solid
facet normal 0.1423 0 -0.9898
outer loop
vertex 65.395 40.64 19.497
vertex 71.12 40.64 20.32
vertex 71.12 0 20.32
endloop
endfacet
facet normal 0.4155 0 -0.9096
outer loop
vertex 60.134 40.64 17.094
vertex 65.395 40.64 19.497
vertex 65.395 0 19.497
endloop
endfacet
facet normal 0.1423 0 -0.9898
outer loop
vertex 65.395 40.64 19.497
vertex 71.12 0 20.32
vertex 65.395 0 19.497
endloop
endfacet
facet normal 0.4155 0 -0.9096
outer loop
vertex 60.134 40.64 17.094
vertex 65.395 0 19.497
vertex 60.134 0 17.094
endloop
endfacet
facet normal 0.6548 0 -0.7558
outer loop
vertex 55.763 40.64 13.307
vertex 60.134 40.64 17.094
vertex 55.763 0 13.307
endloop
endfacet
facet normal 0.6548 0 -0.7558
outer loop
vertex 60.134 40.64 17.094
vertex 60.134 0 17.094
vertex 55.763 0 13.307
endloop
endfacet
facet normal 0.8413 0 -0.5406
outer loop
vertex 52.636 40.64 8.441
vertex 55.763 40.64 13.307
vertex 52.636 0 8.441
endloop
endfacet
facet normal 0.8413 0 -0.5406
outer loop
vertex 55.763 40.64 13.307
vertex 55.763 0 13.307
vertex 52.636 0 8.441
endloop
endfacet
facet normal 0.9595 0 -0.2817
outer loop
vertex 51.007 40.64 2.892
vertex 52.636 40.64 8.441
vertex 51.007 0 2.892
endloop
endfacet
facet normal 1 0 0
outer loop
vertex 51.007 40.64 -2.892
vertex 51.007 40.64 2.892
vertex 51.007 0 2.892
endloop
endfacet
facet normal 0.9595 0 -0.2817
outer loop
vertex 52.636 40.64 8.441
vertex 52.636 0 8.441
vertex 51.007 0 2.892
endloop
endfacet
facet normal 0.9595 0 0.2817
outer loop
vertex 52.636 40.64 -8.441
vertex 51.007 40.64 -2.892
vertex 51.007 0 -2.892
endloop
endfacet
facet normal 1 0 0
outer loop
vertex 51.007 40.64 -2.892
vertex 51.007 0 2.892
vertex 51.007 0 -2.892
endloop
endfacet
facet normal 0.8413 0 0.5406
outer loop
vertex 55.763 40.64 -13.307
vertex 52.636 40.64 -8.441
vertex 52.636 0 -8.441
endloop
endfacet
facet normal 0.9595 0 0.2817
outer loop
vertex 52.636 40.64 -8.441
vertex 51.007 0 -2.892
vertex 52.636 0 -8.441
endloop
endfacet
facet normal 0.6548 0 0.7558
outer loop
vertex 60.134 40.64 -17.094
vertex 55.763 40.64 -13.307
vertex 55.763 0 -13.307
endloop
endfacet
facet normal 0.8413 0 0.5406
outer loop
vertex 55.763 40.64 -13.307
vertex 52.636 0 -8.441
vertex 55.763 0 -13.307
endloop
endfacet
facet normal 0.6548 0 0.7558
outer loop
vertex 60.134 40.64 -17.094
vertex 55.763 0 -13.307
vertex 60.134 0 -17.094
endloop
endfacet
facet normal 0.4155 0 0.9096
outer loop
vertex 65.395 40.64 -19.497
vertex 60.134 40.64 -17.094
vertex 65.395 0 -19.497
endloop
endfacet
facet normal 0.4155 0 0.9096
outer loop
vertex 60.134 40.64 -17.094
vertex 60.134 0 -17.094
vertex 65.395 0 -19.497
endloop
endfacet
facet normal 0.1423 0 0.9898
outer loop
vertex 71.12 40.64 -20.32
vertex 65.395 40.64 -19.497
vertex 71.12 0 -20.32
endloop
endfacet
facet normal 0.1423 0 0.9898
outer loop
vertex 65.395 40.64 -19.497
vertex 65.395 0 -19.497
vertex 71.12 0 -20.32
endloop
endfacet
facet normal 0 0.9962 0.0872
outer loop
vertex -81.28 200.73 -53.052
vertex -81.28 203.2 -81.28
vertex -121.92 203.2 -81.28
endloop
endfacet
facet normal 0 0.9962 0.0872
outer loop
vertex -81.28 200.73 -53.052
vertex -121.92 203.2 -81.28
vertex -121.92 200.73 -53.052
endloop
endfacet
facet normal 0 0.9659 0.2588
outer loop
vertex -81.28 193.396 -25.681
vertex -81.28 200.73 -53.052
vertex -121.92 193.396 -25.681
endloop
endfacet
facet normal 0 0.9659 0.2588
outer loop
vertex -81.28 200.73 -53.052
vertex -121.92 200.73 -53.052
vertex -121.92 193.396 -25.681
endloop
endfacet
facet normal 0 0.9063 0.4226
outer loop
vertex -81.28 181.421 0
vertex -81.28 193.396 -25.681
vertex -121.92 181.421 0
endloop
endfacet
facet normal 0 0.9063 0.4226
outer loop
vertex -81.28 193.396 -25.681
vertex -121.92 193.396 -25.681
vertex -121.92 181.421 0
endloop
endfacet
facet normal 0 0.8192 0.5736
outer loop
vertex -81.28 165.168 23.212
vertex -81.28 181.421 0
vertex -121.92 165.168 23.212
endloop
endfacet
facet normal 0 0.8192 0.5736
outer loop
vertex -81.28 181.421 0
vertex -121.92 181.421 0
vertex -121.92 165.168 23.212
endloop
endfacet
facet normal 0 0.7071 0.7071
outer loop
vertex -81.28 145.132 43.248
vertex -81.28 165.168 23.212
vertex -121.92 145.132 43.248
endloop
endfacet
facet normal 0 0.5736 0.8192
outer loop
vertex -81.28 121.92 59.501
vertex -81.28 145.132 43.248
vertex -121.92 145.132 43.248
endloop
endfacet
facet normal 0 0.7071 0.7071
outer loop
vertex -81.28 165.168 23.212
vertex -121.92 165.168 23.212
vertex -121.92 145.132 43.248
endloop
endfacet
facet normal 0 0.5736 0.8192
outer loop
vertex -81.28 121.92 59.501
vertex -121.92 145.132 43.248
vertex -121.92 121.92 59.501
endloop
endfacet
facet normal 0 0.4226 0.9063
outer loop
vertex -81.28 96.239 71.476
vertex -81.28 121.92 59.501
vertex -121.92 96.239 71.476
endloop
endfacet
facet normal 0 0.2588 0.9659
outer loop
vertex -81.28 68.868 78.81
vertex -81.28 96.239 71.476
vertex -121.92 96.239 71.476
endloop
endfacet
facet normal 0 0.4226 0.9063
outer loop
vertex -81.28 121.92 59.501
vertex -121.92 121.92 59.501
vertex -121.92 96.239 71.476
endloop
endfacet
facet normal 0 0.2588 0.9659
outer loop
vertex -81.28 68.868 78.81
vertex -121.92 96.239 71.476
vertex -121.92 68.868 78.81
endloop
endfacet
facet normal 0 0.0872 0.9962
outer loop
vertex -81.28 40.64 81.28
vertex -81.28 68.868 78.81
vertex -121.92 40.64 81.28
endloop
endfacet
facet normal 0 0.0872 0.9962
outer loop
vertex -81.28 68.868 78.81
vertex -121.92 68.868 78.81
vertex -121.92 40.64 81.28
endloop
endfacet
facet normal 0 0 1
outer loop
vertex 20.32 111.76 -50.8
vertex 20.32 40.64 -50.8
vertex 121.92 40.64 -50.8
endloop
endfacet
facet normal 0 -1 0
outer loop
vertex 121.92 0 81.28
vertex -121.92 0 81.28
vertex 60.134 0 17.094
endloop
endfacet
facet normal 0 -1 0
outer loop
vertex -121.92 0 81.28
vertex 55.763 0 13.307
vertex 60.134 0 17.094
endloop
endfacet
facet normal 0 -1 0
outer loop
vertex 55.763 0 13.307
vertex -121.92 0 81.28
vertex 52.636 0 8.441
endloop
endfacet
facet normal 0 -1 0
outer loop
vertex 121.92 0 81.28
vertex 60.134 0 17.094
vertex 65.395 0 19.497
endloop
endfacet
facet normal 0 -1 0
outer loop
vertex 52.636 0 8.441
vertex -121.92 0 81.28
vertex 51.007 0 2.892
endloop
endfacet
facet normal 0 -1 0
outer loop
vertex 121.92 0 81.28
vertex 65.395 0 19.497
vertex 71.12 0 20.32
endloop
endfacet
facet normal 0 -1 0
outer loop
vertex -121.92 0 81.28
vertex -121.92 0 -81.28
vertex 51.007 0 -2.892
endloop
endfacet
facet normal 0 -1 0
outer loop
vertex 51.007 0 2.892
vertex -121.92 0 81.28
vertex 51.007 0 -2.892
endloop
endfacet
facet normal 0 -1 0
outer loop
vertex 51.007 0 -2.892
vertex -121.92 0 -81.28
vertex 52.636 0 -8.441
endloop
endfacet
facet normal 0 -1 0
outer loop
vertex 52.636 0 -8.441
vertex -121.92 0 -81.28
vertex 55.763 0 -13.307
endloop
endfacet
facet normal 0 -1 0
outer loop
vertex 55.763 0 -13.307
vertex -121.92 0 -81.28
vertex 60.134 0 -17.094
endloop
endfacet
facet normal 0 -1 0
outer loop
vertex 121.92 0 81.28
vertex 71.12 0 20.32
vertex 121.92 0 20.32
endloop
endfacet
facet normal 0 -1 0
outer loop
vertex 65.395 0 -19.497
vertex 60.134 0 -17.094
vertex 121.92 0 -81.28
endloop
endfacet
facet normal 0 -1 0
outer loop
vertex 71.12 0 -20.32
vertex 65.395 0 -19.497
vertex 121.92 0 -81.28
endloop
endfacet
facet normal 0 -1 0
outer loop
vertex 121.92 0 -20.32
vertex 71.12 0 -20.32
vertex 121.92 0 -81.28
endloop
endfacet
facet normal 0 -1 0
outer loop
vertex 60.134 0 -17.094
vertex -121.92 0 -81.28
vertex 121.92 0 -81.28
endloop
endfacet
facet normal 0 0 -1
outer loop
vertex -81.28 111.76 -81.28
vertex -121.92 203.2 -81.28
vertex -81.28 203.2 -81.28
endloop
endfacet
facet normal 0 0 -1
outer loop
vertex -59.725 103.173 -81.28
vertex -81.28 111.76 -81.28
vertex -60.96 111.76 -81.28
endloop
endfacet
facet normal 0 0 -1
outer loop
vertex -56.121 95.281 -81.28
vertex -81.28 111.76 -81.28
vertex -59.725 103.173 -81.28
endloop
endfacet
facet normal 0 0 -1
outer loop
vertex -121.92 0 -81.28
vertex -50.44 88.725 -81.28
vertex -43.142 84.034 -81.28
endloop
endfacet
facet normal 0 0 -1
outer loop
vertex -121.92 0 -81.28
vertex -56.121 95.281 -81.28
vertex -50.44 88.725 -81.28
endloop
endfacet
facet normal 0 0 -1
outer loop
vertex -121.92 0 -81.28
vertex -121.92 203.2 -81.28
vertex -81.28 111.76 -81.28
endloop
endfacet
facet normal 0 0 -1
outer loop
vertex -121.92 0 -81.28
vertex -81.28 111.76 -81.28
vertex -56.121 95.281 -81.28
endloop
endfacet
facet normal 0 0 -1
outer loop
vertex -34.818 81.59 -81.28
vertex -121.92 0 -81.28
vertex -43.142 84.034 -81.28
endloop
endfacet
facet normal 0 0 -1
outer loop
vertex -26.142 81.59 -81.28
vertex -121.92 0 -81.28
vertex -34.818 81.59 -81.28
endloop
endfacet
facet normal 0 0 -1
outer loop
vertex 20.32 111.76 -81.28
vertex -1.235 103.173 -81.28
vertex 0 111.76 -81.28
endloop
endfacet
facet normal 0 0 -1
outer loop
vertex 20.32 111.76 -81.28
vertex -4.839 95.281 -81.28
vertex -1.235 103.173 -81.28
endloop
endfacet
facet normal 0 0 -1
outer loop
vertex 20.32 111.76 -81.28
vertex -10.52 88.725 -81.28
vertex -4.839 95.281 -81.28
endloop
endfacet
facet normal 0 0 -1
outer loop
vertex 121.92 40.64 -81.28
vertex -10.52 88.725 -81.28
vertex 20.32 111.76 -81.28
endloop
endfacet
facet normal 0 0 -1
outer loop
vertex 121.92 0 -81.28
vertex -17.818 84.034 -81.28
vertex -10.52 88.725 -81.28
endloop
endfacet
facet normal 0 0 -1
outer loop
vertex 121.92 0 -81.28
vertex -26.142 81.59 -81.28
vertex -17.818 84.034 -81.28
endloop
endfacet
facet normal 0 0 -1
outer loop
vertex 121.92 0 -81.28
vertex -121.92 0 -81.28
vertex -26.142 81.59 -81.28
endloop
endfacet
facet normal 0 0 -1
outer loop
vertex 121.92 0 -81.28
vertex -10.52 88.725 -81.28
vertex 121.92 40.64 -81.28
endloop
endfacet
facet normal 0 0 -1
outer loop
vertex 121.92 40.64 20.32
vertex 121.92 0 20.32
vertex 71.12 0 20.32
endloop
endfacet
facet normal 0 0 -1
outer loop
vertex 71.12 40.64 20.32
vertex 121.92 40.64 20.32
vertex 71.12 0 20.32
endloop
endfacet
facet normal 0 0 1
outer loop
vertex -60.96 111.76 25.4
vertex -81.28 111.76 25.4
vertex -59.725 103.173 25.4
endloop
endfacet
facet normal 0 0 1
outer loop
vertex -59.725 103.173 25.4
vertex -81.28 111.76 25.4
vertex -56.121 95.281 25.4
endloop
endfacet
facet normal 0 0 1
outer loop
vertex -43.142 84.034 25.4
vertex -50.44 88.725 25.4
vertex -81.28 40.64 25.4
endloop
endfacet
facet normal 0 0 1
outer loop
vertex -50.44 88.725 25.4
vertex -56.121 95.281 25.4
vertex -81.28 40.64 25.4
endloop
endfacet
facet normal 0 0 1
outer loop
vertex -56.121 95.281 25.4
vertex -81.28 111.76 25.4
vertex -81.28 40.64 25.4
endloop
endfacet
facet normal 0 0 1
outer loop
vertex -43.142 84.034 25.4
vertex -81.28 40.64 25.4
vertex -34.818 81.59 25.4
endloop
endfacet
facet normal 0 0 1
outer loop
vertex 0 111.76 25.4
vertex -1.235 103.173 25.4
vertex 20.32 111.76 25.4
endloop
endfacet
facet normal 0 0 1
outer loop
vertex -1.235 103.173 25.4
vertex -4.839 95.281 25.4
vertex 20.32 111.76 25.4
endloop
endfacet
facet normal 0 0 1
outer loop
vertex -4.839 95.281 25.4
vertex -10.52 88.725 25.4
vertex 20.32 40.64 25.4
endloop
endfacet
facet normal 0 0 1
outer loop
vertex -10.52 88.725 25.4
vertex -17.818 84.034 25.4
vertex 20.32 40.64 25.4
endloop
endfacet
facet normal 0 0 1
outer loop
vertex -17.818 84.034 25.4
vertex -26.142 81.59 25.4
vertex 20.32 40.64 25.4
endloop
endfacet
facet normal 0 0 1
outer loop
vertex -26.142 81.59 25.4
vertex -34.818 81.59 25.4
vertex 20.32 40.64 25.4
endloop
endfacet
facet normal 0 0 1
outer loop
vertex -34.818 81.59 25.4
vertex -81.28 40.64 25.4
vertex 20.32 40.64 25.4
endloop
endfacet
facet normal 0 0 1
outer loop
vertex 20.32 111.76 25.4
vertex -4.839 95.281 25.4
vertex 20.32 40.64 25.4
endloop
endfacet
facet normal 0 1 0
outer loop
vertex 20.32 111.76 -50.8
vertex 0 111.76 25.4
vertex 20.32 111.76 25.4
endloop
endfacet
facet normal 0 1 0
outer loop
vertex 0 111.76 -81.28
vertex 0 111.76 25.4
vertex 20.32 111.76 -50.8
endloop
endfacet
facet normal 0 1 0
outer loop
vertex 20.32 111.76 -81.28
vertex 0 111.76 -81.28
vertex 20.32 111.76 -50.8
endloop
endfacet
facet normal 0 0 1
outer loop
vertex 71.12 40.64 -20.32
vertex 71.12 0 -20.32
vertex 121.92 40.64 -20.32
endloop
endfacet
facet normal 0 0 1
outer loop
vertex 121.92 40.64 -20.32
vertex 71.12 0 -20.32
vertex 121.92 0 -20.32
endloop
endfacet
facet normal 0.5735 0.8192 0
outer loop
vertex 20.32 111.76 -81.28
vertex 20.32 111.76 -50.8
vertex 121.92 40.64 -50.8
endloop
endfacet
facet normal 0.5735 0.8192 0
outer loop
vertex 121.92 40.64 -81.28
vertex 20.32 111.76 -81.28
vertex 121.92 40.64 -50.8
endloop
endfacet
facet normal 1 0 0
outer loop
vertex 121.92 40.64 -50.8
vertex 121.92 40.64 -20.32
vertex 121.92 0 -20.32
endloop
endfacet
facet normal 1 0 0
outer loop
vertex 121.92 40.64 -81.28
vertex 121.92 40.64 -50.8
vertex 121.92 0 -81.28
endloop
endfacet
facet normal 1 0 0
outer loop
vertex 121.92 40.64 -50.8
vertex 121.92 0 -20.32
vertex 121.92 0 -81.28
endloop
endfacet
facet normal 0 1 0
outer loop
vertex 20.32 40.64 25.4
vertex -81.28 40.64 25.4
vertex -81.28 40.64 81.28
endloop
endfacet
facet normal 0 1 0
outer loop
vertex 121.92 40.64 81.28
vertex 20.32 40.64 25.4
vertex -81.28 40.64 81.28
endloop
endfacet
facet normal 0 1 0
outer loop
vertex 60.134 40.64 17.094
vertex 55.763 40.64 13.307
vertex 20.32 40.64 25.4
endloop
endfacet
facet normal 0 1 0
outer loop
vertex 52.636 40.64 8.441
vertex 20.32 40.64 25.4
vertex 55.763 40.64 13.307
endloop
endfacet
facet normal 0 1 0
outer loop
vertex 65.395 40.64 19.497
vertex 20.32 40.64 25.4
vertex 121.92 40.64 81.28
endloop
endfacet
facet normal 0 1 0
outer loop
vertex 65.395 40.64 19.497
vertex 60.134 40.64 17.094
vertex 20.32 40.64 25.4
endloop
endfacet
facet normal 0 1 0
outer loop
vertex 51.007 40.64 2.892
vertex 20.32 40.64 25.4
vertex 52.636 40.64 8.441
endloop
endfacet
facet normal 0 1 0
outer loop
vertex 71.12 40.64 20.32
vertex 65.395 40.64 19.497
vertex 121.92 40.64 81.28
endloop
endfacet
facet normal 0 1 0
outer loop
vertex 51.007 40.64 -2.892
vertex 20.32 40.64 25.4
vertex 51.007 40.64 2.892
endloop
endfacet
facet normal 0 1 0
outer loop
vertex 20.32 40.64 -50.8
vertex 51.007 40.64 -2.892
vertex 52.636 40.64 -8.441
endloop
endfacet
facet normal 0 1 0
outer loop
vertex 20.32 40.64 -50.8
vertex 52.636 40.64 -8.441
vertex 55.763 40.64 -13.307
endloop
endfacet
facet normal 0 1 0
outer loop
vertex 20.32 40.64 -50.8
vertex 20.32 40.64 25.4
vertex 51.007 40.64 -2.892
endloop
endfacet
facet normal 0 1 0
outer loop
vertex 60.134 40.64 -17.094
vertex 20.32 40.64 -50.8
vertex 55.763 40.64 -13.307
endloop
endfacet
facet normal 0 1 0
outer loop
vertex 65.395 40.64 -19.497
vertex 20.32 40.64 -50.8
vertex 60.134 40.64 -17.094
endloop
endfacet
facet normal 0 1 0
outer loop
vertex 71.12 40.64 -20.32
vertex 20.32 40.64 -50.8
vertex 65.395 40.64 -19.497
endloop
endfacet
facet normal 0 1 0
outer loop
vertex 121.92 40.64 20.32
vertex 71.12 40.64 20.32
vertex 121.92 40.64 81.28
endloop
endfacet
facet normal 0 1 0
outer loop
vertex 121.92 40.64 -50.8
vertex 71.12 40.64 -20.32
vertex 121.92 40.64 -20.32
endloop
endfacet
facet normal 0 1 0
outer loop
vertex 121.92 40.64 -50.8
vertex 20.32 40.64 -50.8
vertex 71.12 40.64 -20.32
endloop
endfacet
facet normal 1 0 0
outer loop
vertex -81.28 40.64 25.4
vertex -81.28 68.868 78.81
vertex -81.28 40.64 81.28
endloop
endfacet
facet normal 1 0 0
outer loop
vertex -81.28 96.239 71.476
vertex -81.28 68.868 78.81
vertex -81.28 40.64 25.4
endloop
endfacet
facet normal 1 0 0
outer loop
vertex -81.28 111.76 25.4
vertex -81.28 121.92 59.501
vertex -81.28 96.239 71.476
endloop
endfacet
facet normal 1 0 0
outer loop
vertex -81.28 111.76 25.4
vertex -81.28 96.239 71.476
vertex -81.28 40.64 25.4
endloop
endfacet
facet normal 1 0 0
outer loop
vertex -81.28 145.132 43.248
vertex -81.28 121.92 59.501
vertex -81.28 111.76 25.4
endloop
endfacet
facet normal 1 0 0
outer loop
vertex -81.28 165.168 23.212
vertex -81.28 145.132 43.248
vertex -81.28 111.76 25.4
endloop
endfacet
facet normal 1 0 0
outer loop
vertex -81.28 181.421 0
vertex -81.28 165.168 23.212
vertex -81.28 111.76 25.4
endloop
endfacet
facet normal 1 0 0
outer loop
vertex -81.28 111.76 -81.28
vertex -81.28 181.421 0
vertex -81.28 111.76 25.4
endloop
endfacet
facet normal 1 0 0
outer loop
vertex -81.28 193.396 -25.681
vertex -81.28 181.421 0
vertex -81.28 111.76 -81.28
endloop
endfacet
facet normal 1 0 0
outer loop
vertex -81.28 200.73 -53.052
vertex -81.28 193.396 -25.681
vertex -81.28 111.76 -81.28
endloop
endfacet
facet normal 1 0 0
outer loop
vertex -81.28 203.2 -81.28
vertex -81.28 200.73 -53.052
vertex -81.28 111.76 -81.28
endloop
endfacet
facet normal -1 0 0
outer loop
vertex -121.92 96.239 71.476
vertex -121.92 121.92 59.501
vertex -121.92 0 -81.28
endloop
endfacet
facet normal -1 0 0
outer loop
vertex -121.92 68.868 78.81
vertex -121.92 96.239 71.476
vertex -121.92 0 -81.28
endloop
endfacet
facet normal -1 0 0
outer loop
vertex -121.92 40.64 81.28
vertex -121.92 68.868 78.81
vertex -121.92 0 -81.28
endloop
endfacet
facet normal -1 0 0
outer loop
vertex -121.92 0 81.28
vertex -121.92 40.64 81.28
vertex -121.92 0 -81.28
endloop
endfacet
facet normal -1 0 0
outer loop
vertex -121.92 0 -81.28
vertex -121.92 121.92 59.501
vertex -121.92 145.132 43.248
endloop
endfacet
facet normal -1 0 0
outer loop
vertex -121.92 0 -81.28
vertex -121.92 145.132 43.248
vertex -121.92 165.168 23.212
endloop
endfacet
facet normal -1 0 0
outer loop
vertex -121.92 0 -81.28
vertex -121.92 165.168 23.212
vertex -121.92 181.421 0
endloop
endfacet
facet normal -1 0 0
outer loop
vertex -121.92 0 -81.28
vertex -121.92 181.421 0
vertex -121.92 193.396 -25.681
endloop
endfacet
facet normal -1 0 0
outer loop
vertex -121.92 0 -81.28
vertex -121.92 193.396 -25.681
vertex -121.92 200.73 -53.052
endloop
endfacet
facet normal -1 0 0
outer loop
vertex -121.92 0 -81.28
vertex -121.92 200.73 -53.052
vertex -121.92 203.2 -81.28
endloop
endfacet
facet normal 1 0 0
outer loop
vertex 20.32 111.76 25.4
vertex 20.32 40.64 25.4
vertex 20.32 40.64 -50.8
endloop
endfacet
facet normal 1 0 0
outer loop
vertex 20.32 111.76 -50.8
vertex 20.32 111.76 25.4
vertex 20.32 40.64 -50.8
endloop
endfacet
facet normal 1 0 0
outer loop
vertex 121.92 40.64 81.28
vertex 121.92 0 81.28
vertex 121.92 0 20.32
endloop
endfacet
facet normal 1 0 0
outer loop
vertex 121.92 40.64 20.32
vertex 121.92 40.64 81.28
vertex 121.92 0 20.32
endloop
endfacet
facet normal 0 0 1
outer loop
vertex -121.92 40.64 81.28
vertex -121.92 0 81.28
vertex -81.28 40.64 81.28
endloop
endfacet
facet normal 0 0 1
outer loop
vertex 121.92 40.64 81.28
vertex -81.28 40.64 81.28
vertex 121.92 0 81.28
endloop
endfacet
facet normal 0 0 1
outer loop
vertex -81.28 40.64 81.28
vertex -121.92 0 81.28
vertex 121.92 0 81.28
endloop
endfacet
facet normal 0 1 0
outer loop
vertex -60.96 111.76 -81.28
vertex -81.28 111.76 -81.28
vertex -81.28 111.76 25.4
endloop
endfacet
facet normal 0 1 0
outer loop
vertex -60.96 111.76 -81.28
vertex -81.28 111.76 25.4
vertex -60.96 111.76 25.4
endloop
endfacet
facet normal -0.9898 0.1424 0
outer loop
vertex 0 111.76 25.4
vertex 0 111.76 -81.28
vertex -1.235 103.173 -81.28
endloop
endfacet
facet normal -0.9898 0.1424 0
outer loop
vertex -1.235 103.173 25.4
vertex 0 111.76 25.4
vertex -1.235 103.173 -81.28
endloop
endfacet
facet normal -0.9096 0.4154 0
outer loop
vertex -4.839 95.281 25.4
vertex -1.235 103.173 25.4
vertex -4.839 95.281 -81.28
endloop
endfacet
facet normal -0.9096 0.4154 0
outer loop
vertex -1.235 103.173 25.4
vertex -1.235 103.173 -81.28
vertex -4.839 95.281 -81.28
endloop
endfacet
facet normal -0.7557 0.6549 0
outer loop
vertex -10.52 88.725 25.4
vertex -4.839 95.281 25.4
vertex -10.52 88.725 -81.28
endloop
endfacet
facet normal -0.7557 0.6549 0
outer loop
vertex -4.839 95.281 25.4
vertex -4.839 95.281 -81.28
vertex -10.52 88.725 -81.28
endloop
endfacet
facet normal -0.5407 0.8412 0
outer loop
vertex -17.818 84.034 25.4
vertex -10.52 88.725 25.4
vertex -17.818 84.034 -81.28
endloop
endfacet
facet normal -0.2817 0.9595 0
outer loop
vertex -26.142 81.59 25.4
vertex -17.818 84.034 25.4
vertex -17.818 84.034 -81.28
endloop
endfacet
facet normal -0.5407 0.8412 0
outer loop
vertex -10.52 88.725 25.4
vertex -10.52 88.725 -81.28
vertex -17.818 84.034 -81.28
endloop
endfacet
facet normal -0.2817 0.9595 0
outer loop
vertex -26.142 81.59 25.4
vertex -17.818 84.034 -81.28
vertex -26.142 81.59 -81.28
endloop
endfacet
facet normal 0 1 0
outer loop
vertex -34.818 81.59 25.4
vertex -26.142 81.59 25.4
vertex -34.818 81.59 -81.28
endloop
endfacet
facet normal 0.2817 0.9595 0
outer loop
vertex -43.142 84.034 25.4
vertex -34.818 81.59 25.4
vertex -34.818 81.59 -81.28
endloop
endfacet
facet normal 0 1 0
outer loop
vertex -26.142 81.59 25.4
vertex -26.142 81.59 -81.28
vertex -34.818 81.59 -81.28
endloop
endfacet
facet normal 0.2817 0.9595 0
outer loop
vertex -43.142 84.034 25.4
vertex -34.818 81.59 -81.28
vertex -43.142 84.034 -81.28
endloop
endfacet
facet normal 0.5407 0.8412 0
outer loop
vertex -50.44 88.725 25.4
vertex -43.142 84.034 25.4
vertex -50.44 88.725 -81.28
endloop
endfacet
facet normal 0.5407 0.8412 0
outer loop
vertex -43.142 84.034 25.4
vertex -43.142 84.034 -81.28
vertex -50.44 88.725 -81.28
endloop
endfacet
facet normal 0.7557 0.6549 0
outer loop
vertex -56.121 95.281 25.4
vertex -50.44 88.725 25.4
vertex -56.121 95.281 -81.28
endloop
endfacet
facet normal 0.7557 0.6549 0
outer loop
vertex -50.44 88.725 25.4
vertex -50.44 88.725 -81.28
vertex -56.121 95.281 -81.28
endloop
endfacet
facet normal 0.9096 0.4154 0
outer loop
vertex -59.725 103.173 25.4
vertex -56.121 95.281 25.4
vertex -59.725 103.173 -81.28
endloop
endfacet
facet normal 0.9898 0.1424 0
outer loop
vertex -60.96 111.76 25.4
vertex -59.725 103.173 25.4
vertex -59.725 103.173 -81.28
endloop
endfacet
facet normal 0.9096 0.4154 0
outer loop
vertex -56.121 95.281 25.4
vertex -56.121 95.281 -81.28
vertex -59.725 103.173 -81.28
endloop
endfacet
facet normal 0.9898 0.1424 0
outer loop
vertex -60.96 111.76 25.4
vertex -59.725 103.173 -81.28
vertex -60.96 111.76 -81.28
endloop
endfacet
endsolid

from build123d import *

# Parameters (mm, degrees)
BOSS_EXTRUDE1_DEPTH     = 40.64
BOSS_EXTRUDE2_DEPTH     = 40.64
SKETCH3_W               = 101.6
SKETCH3_H               = 106.68
BOSS_EXTRUDE3_DEPTH     = 71.12
CUT_EXTRUDE1_DEPTH      = 260.875641029
CUT_EXTRUDE1_DEPTH_BACK = 260.875641029
SKETCH5_W               = 101.6
SKETCH5_H               = 30.48
BOSS_EXTRUDE4_DEPTH     = 71.12
CUT_EXTRUDE2_DEPTH      = 71.12


with BuildPart() as part:
    # Sketch1 → Boss-Extrude1 (new body)
    with BuildSketch(Plane(origin=(0, 0, 0), x_dir=(1, 0, 0), z_dir=(0, 1, 0))):
        with BuildLine():
            Line((-121.92, -81.28), (121.92, -81.28))
            Line((121.92, -81.28), (121.92, -20.32))
            Line((121.92, -20.32), (71.12, -20.32))
            ThreePointArc((71.12, -20.32), (50.8, 0), (71.12, 20.32))
            Line((71.12, 20.32), (121.92, 20.32))
            Line((121.92, 20.32), (121.92, 81.28))
            Line((121.92, 81.28), (-121.92, 81.28))
            Line((-121.92, 81.28), (-121.92, -81.28))
        make_face()
    extrude(amount=BOSS_EXTRUDE1_DEPTH)

    # Sketch2 → Boss-Extrude2 (add)
    with BuildSketch(Plane.ZY.offset(121.92)):
        with BuildLine():
            Line((-81.28, 40.64), (-81.28, 203.2))
            ThreePointArc((-81.28, 203.2), (33.66727835, 155.58727835), (81.28, 40.64))
            Line((81.28, 40.64), (-81.28, 40.64))
        make_face()
    extrude(amount=-BOSS_EXTRUDE2_DEPTH)

    # Sketch3 → Boss-Extrude3 (add)
    with BuildSketch(Plane(origin=(0, 40.64, 0), x_dir=(1, 0, 0), z_dir=(0, 1, 0))):
        with Locations((-30.48, 27.94)):
            Rectangle(SKETCH3_W, SKETCH3_H)
    extrude(amount=BOSS_EXTRUDE3_DEPTH)

    # Sketch4 → Cut-Extrude1 (cut, two sides: drawn at the far end of the back side and taken through both)
    with BuildSketch(Plane.XY.offset(25.4).offset(-CUT_EXTRUDE1_DEPTH_BACK)):
        with BuildLine():
            Line((-60.96, 111.76), (0, 111.76))
            ThreePointArc((0, 111.76), (-30.48, 81.28), (-60.96, 111.76))
        make_face()
    extrude(amount=CUT_EXTRUDE1_DEPTH + CUT_EXTRUDE1_DEPTH_BACK, mode=Mode.SUBTRACT)

    # Sketch5 → Boss-Extrude4 (add)
    with BuildSketch(Plane(origin=(0, 40.64, 0), x_dir=(1, 0, 0), z_dir=(0, 1, 0))):
        with Locations((71.12, 66.04)):
            Rectangle(SKETCH5_W, SKETCH5_H)
    extrude(amount=BOSS_EXTRUDE4_DEPTH)

    # Sketch6 → Cut-Extrude2 (cut)
    with BuildSketch(Plane.XY.offset(-50.8)):
        Polygon((20.32, 111.76), (121.92, 40.64), (121.92, 111.76), align=None)
    extrude(amount=-CUT_EXTRUDE2_DEPTH, mode=Mode.SUBTRACT)


solid = part.part
